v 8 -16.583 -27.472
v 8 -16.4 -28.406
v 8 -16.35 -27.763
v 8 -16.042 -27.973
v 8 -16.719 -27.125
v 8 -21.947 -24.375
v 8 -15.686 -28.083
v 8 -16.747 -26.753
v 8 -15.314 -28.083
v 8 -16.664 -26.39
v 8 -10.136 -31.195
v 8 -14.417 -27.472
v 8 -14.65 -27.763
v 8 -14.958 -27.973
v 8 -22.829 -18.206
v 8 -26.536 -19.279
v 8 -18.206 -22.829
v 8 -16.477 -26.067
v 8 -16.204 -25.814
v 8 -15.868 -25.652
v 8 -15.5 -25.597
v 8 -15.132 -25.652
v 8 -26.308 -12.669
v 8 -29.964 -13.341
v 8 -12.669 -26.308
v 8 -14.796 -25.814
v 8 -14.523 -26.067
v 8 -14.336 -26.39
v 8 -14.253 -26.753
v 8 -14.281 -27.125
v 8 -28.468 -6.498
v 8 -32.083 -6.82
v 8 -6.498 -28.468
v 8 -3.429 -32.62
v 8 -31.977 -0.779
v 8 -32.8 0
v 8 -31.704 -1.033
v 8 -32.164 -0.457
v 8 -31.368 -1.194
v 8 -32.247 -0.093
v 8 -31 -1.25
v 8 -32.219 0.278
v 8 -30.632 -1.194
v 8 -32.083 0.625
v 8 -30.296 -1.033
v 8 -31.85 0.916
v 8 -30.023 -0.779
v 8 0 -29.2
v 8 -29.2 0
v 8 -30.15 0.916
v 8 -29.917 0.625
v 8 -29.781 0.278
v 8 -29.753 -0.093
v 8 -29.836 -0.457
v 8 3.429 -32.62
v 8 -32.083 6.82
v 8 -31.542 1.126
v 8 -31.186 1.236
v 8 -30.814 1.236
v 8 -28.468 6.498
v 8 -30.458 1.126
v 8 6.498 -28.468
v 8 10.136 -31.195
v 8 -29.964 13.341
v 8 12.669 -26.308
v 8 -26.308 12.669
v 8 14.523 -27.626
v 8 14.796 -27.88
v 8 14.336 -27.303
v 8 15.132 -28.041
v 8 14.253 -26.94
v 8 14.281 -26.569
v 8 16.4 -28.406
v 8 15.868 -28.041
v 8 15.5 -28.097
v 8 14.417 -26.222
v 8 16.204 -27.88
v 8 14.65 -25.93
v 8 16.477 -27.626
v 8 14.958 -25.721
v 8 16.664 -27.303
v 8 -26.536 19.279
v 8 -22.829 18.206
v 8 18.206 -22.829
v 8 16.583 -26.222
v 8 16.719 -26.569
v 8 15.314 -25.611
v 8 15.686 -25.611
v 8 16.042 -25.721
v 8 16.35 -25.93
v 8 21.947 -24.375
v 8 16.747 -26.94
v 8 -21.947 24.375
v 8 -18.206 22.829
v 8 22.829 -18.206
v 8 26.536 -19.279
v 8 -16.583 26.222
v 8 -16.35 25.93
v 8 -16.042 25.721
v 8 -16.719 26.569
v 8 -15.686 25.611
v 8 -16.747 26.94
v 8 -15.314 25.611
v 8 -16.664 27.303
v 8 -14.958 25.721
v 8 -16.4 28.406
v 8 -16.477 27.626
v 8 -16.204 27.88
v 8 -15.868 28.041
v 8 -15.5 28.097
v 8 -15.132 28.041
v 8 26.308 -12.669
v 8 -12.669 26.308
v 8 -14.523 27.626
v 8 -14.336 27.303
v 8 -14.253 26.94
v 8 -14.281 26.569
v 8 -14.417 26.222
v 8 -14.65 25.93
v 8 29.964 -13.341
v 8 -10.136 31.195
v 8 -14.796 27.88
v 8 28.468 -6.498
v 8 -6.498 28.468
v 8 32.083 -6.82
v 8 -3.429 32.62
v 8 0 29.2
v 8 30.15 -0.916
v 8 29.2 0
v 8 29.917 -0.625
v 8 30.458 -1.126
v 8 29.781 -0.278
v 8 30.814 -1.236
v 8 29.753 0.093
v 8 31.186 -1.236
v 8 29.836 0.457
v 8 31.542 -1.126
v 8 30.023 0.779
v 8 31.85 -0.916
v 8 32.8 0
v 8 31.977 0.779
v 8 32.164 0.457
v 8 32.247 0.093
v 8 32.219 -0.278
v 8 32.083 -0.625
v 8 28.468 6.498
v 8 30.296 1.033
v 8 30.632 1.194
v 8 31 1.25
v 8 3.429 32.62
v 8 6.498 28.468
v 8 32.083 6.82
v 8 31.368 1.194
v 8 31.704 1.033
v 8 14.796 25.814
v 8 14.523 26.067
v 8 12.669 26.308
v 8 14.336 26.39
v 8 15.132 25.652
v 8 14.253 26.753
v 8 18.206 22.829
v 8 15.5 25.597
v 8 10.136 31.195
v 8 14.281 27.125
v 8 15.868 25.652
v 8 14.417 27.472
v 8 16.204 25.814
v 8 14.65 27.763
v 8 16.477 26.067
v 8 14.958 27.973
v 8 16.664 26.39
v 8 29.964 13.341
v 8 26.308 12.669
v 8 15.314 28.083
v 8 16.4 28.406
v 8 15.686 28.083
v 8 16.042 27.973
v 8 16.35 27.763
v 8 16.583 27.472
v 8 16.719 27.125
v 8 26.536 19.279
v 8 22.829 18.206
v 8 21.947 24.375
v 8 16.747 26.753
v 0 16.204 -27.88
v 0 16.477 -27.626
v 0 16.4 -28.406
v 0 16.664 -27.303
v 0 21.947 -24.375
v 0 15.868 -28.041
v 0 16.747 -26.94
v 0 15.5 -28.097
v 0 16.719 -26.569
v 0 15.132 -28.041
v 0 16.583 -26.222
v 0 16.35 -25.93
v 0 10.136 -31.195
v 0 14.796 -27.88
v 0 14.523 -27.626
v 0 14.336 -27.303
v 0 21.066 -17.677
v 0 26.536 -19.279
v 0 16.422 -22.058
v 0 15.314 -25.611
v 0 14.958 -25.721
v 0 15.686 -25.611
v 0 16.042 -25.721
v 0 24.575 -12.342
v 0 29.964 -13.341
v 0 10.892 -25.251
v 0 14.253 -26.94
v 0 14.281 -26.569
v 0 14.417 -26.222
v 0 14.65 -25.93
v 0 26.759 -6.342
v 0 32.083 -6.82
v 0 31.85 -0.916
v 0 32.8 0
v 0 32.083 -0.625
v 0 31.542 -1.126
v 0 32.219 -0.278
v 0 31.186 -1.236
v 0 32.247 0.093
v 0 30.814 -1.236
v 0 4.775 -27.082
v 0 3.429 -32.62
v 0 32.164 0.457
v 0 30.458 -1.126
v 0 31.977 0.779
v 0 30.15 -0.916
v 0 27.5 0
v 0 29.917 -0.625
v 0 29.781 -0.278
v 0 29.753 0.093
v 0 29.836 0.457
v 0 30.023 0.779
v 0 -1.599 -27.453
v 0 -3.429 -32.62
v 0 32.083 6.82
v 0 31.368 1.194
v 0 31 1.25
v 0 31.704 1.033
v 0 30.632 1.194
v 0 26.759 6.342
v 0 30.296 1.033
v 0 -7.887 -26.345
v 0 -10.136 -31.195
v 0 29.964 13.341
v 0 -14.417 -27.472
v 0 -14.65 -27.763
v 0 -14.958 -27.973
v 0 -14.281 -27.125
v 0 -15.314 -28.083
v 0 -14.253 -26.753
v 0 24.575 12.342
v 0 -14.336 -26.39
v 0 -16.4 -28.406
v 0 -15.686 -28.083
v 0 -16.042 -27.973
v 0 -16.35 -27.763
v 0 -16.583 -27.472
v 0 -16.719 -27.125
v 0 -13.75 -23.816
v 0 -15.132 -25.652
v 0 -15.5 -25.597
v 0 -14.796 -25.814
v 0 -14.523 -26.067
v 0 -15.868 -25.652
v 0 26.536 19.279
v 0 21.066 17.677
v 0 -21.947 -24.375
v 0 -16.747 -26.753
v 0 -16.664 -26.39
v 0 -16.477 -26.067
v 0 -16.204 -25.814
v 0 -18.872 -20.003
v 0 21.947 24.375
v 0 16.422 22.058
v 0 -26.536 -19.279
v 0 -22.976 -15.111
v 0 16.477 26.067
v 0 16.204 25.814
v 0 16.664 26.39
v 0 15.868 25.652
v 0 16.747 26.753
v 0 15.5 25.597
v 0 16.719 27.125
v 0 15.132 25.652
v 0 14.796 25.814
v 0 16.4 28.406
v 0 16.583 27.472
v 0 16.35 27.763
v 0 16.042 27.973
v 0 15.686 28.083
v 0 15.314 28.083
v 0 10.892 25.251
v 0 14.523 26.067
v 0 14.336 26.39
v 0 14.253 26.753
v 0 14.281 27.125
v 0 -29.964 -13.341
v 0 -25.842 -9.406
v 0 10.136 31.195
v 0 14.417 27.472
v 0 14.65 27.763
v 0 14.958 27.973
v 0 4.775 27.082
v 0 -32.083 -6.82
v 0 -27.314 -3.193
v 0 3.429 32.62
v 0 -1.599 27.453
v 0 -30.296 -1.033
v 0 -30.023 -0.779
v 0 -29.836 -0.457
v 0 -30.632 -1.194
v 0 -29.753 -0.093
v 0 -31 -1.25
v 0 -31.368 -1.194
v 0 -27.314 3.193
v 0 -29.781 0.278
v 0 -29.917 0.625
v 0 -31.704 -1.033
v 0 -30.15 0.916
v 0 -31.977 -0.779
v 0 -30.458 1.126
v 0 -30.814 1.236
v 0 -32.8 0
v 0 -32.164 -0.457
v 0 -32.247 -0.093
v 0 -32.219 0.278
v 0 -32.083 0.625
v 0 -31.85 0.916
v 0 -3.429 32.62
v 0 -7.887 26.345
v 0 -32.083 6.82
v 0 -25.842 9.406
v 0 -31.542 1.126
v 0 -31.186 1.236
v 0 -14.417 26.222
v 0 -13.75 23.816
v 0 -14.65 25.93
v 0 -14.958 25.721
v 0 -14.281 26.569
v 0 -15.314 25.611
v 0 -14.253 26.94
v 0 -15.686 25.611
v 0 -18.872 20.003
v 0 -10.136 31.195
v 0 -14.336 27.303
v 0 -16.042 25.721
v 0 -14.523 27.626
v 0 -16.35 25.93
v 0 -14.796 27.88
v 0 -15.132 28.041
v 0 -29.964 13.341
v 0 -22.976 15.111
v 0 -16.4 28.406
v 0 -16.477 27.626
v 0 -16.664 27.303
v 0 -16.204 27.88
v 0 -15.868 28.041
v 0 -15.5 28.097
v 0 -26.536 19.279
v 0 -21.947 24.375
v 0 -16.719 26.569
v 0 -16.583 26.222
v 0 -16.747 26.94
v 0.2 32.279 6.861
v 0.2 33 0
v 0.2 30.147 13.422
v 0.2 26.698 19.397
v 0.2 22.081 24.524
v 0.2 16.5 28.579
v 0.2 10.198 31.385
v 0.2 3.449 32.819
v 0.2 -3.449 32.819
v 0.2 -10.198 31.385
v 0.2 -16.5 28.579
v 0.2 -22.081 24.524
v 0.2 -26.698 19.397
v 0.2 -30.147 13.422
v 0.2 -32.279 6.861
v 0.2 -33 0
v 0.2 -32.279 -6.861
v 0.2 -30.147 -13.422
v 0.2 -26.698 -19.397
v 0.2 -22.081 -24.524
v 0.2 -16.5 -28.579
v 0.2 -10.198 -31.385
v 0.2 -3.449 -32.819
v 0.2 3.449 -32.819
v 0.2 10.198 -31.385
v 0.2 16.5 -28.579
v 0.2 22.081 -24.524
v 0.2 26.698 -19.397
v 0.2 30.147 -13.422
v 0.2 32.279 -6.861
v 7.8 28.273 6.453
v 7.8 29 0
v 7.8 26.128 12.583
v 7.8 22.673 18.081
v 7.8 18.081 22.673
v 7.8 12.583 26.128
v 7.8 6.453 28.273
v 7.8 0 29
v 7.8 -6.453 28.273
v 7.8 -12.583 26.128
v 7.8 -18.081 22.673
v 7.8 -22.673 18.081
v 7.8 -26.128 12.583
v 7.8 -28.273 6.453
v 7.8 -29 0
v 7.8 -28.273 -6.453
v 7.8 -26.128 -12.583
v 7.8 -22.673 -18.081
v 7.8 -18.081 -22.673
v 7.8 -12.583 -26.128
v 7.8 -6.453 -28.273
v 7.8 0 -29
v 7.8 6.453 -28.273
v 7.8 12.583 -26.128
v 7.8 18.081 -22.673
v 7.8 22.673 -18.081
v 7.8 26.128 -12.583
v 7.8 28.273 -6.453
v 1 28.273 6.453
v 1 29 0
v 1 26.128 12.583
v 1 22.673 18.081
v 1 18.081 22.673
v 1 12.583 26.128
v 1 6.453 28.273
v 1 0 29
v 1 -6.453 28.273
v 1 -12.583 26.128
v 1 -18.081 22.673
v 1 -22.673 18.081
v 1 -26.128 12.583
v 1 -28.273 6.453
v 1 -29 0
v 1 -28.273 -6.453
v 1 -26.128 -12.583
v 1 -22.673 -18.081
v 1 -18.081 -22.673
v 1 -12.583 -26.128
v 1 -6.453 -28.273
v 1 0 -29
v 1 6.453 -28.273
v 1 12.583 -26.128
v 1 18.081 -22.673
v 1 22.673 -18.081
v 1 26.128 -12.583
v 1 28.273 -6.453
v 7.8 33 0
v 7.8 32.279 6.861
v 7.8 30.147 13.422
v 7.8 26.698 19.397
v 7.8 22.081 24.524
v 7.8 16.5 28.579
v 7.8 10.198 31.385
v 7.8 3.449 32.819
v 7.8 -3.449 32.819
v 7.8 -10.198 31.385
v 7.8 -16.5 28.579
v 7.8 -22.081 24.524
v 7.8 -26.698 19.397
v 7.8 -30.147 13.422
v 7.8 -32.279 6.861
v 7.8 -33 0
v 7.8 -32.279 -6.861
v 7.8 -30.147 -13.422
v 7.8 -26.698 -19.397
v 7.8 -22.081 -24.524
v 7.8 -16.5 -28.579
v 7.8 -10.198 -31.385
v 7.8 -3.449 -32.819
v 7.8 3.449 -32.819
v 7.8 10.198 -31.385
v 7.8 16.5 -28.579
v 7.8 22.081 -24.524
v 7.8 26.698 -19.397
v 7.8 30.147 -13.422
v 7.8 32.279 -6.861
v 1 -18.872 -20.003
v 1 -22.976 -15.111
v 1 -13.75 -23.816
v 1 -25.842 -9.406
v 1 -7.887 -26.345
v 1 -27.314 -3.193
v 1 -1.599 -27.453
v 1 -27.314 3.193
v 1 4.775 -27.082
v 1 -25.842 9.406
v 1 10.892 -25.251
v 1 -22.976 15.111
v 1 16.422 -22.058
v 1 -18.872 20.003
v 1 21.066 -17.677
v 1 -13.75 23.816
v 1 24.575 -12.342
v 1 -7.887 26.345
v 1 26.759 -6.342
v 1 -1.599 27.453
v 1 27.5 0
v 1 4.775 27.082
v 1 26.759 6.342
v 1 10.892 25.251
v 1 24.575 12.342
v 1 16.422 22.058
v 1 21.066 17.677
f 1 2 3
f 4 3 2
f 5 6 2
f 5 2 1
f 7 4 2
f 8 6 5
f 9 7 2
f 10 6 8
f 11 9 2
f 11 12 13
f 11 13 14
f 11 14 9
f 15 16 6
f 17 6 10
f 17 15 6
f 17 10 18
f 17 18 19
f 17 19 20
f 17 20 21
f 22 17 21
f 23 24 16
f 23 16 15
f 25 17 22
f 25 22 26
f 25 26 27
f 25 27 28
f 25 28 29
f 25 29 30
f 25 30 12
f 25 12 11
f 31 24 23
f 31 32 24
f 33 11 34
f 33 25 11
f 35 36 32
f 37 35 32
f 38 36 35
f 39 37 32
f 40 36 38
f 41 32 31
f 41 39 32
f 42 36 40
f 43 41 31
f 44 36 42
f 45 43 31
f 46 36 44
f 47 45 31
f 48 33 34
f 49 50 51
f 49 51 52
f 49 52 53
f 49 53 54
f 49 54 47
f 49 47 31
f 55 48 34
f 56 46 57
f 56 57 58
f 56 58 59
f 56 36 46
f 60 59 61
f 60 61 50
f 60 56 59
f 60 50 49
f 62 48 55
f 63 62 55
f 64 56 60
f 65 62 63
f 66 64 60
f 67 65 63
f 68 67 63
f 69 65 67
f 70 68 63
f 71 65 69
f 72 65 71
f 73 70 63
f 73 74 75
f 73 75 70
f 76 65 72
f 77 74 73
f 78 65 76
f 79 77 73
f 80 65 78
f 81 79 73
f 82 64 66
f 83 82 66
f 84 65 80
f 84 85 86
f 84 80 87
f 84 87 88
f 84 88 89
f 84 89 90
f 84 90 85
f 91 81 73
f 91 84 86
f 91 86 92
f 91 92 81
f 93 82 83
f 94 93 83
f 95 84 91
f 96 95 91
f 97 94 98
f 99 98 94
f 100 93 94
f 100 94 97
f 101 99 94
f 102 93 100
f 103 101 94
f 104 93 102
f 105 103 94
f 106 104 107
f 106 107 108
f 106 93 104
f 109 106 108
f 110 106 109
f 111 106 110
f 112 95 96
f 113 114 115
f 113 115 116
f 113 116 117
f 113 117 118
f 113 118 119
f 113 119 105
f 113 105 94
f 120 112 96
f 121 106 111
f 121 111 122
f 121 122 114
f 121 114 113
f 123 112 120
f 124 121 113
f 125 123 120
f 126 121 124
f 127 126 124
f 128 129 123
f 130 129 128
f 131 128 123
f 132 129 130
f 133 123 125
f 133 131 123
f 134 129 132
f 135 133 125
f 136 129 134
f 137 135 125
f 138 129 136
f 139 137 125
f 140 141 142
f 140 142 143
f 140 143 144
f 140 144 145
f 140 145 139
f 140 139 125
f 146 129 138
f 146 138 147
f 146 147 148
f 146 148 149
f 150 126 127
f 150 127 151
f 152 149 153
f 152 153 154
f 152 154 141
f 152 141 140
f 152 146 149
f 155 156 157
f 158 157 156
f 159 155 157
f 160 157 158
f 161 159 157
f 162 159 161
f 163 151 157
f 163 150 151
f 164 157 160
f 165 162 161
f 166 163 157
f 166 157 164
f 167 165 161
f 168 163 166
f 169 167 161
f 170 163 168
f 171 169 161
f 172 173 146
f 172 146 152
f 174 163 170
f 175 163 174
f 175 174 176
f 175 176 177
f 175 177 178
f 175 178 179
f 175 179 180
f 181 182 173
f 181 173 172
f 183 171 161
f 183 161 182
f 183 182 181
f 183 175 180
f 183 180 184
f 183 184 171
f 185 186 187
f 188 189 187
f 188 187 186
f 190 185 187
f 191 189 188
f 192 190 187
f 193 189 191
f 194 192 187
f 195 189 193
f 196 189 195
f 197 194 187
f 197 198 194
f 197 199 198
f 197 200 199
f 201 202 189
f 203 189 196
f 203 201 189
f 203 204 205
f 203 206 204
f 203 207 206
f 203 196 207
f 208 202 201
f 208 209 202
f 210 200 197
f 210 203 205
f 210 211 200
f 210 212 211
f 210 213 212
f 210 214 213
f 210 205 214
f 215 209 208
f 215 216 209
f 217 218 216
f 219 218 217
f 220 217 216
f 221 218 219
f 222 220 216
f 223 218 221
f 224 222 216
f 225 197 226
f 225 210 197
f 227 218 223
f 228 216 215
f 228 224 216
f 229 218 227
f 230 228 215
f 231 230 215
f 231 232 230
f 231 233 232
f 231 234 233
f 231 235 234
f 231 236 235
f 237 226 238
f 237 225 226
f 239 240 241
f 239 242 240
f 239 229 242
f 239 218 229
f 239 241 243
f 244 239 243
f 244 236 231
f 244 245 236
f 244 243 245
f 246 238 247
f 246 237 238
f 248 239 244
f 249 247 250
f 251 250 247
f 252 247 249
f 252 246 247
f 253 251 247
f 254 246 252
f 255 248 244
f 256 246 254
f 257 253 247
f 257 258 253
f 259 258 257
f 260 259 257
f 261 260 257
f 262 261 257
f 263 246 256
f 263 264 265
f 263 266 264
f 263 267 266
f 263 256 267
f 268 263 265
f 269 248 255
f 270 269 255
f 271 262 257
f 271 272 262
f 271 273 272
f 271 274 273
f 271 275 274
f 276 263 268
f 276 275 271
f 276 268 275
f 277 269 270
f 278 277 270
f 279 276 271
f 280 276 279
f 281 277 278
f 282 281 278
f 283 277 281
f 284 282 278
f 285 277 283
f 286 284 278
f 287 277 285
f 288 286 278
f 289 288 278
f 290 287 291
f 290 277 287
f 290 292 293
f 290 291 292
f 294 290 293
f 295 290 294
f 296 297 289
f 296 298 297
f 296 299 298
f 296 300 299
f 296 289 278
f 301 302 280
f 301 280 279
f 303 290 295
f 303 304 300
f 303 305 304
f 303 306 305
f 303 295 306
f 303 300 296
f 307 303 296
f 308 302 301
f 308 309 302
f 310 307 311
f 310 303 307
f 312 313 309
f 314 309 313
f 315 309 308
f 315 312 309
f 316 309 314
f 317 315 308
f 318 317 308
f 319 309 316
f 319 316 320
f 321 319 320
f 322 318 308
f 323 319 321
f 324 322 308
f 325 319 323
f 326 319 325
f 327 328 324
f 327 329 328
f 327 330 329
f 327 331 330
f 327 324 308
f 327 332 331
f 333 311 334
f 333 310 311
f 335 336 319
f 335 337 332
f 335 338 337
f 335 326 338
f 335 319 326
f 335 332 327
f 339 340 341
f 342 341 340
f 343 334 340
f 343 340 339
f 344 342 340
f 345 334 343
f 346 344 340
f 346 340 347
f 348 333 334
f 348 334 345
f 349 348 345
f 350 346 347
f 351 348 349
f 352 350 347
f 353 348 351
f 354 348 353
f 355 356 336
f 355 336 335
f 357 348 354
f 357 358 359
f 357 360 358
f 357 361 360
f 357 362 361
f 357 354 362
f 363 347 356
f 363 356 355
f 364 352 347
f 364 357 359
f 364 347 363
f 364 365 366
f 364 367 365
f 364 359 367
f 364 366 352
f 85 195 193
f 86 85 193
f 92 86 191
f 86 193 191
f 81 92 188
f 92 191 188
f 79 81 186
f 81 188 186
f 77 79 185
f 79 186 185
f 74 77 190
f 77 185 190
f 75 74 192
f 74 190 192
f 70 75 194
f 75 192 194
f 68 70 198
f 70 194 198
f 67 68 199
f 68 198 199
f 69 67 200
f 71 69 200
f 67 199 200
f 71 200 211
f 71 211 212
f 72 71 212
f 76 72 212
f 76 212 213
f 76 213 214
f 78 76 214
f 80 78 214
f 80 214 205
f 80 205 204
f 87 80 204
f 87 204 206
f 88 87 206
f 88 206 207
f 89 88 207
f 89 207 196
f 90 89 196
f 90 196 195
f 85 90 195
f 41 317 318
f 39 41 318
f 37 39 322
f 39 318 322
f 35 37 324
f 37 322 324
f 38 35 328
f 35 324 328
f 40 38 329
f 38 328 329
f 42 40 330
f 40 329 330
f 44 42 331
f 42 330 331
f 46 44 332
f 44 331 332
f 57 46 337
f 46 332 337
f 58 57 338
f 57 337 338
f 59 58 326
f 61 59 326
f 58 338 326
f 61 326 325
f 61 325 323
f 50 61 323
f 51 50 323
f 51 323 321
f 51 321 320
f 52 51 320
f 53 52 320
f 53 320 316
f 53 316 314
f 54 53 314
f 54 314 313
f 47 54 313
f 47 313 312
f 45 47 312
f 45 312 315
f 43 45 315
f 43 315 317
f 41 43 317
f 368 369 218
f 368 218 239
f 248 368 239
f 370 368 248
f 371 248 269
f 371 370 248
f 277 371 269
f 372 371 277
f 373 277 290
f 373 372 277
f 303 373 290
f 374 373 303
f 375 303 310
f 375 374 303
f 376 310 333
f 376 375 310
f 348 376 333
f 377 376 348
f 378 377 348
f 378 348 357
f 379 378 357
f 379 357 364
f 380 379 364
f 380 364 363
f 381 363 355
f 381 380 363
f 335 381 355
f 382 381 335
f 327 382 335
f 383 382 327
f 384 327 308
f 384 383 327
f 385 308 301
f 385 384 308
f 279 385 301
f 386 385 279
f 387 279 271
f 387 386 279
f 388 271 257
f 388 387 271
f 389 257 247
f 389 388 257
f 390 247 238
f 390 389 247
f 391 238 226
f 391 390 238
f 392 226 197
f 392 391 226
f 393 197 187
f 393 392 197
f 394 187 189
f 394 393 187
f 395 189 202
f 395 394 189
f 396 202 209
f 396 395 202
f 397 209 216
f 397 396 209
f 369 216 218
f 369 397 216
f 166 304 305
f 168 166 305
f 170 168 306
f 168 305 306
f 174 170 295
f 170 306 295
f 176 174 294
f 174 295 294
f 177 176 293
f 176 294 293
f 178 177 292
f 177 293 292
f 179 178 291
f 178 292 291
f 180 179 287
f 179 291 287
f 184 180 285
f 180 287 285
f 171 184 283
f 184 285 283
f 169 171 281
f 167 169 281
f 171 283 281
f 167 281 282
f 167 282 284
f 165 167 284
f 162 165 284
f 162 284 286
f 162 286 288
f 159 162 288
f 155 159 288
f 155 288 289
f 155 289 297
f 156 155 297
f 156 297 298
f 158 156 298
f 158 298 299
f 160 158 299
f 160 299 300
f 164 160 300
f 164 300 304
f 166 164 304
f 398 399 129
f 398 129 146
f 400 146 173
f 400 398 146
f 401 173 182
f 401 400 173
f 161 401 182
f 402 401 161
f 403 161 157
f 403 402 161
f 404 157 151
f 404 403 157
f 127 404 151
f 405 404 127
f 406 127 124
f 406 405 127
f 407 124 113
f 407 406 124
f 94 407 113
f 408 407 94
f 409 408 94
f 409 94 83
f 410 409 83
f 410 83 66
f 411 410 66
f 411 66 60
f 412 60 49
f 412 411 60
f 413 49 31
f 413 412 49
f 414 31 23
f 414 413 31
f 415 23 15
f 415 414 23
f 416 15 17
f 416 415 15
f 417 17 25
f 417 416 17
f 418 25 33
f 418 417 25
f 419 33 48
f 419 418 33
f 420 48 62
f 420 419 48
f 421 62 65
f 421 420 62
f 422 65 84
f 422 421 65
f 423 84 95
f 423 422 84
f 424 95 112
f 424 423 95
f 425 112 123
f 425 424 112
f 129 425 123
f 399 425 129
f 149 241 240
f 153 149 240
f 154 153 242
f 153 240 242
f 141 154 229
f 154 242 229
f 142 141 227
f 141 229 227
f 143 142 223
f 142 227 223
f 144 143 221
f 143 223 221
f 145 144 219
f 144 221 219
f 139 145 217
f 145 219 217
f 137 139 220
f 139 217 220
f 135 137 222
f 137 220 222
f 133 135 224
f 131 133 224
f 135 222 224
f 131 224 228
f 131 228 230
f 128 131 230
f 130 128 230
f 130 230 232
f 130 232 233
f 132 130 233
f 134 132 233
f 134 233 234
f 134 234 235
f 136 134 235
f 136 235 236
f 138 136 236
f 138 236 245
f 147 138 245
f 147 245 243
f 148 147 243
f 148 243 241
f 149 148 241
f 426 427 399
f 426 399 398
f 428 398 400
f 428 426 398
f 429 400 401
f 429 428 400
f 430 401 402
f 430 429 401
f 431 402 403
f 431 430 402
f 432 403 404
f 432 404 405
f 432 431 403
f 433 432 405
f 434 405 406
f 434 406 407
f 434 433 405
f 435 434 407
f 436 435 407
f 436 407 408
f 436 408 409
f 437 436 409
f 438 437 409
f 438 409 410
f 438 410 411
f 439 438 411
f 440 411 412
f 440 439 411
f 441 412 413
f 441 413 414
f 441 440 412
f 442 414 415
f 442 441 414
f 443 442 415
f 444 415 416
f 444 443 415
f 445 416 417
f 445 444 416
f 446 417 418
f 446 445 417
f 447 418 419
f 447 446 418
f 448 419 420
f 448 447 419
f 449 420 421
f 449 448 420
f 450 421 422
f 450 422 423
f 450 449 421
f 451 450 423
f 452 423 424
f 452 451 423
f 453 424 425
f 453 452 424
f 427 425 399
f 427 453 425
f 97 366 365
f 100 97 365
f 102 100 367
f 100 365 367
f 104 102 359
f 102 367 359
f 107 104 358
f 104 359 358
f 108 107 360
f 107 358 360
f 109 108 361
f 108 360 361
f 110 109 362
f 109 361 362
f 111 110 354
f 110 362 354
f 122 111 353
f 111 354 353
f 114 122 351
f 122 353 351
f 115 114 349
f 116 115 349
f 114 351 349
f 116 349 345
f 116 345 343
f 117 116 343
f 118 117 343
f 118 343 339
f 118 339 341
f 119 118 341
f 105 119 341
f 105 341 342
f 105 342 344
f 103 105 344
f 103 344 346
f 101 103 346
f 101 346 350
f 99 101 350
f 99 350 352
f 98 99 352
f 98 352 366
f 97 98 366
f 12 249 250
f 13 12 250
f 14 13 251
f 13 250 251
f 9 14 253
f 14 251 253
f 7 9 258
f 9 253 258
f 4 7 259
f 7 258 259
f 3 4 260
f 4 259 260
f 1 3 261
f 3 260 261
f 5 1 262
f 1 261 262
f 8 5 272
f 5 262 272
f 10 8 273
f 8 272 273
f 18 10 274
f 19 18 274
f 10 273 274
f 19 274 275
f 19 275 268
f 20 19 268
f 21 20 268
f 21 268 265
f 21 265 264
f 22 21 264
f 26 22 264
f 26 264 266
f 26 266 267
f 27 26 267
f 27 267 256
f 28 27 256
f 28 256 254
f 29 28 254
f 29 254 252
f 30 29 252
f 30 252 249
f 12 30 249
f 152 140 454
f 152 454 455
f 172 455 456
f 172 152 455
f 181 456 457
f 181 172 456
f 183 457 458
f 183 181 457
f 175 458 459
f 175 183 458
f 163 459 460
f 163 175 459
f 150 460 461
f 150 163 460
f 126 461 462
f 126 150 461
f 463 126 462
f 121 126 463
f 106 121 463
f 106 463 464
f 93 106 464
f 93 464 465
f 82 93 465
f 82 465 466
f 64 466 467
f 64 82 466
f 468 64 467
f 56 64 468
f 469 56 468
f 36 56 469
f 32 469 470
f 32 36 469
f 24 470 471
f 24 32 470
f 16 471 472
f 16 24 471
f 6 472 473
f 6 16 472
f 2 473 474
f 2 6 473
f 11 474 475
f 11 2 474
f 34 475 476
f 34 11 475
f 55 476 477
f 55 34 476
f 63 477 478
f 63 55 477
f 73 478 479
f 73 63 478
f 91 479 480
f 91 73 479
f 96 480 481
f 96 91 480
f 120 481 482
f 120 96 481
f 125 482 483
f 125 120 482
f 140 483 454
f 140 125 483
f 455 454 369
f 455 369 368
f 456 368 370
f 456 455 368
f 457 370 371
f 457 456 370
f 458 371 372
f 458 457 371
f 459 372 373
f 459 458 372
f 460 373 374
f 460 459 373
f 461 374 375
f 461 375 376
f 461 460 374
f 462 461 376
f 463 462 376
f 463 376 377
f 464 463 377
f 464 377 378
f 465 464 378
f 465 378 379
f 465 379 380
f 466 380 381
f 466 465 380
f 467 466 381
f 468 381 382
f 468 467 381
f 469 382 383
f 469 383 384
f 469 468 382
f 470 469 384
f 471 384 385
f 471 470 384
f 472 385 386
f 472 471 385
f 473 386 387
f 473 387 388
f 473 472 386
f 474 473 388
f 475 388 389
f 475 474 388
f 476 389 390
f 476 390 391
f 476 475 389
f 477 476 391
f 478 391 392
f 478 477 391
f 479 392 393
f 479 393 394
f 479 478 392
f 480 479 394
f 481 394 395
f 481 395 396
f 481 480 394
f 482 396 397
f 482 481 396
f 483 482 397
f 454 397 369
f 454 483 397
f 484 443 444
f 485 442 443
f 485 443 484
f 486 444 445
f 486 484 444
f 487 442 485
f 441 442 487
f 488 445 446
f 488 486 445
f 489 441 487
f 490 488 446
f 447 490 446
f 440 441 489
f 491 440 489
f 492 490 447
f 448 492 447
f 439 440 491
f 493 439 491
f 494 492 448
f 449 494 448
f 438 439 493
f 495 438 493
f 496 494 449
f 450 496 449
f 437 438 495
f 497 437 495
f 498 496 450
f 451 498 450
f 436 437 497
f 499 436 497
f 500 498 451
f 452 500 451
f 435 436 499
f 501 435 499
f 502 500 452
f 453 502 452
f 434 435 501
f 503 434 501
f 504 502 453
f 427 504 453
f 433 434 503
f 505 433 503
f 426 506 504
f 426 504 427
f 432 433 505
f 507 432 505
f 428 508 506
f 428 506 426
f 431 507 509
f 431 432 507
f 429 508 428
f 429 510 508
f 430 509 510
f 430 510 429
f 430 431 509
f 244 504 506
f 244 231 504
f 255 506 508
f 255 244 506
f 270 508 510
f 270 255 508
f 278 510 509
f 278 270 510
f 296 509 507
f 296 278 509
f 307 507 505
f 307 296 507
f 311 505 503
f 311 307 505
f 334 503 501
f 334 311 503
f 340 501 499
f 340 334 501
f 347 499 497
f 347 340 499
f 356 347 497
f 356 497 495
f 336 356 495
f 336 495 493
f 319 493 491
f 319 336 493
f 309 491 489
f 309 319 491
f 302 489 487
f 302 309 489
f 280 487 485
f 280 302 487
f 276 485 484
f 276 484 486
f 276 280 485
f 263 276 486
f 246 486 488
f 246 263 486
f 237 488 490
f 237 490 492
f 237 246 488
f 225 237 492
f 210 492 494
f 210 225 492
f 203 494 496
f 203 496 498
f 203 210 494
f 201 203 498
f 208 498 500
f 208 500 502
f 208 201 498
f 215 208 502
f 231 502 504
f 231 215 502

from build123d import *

# Parameters (mm, degrees)
HOLE_WIZARD_M3_1_D       = 2.5
PATTERN_CIRCULAR_1_COUNT = 6
CHAMFER_1_SIZE           = 0.2


with BuildPart() as part:
    # 草图1 → 旋转1 (revolve)
    with BuildSketch(Plane.XY):
        Polygon((0, 27.5), (0, 33), (8, 33), (8, 29), (1, 29), (1, 27.5), align=None)
    revolve(axis=Axis((0, 0, 0), (1, 0, 0)))

    # M3 螺纹孔1 (through all)
    with Locations(Plane(origin=(8, 0, 0), x_dir=(0, 0, -1), z_dir=(1, 0, 0))):
        with Locations((0, 31)):
            hole_wizard_m3_1 = Hole(HOLE_WIZARD_M3_1_D / 2)

    # 阵列(圆周)1: M3 螺纹孔1 ×6 about axis
    pattern_circular_1_axis = Axis((0, 0, 0), (1, 0, 0))
    for i in range(1, PATTERN_CIRCULAR_1_COUNT):
        add(hole_wizard_m3_1.rotate(pattern_circular_1_axis, i * 360 / PATTERN_CIRCULAR_1_COUNT), mode=Mode.SUBTRACT)

    # 倒角1
    chamfer_1_edges = [part.edges().sort_by_distance(p)[0] for p in [
        (8, -29, 0),
        (8, -33, 0),
        (0, -33, 0),
    ]]
    chamfer(chamfer_1_edges, length=CHAMFER_1_SIZE)


solid = part.part
